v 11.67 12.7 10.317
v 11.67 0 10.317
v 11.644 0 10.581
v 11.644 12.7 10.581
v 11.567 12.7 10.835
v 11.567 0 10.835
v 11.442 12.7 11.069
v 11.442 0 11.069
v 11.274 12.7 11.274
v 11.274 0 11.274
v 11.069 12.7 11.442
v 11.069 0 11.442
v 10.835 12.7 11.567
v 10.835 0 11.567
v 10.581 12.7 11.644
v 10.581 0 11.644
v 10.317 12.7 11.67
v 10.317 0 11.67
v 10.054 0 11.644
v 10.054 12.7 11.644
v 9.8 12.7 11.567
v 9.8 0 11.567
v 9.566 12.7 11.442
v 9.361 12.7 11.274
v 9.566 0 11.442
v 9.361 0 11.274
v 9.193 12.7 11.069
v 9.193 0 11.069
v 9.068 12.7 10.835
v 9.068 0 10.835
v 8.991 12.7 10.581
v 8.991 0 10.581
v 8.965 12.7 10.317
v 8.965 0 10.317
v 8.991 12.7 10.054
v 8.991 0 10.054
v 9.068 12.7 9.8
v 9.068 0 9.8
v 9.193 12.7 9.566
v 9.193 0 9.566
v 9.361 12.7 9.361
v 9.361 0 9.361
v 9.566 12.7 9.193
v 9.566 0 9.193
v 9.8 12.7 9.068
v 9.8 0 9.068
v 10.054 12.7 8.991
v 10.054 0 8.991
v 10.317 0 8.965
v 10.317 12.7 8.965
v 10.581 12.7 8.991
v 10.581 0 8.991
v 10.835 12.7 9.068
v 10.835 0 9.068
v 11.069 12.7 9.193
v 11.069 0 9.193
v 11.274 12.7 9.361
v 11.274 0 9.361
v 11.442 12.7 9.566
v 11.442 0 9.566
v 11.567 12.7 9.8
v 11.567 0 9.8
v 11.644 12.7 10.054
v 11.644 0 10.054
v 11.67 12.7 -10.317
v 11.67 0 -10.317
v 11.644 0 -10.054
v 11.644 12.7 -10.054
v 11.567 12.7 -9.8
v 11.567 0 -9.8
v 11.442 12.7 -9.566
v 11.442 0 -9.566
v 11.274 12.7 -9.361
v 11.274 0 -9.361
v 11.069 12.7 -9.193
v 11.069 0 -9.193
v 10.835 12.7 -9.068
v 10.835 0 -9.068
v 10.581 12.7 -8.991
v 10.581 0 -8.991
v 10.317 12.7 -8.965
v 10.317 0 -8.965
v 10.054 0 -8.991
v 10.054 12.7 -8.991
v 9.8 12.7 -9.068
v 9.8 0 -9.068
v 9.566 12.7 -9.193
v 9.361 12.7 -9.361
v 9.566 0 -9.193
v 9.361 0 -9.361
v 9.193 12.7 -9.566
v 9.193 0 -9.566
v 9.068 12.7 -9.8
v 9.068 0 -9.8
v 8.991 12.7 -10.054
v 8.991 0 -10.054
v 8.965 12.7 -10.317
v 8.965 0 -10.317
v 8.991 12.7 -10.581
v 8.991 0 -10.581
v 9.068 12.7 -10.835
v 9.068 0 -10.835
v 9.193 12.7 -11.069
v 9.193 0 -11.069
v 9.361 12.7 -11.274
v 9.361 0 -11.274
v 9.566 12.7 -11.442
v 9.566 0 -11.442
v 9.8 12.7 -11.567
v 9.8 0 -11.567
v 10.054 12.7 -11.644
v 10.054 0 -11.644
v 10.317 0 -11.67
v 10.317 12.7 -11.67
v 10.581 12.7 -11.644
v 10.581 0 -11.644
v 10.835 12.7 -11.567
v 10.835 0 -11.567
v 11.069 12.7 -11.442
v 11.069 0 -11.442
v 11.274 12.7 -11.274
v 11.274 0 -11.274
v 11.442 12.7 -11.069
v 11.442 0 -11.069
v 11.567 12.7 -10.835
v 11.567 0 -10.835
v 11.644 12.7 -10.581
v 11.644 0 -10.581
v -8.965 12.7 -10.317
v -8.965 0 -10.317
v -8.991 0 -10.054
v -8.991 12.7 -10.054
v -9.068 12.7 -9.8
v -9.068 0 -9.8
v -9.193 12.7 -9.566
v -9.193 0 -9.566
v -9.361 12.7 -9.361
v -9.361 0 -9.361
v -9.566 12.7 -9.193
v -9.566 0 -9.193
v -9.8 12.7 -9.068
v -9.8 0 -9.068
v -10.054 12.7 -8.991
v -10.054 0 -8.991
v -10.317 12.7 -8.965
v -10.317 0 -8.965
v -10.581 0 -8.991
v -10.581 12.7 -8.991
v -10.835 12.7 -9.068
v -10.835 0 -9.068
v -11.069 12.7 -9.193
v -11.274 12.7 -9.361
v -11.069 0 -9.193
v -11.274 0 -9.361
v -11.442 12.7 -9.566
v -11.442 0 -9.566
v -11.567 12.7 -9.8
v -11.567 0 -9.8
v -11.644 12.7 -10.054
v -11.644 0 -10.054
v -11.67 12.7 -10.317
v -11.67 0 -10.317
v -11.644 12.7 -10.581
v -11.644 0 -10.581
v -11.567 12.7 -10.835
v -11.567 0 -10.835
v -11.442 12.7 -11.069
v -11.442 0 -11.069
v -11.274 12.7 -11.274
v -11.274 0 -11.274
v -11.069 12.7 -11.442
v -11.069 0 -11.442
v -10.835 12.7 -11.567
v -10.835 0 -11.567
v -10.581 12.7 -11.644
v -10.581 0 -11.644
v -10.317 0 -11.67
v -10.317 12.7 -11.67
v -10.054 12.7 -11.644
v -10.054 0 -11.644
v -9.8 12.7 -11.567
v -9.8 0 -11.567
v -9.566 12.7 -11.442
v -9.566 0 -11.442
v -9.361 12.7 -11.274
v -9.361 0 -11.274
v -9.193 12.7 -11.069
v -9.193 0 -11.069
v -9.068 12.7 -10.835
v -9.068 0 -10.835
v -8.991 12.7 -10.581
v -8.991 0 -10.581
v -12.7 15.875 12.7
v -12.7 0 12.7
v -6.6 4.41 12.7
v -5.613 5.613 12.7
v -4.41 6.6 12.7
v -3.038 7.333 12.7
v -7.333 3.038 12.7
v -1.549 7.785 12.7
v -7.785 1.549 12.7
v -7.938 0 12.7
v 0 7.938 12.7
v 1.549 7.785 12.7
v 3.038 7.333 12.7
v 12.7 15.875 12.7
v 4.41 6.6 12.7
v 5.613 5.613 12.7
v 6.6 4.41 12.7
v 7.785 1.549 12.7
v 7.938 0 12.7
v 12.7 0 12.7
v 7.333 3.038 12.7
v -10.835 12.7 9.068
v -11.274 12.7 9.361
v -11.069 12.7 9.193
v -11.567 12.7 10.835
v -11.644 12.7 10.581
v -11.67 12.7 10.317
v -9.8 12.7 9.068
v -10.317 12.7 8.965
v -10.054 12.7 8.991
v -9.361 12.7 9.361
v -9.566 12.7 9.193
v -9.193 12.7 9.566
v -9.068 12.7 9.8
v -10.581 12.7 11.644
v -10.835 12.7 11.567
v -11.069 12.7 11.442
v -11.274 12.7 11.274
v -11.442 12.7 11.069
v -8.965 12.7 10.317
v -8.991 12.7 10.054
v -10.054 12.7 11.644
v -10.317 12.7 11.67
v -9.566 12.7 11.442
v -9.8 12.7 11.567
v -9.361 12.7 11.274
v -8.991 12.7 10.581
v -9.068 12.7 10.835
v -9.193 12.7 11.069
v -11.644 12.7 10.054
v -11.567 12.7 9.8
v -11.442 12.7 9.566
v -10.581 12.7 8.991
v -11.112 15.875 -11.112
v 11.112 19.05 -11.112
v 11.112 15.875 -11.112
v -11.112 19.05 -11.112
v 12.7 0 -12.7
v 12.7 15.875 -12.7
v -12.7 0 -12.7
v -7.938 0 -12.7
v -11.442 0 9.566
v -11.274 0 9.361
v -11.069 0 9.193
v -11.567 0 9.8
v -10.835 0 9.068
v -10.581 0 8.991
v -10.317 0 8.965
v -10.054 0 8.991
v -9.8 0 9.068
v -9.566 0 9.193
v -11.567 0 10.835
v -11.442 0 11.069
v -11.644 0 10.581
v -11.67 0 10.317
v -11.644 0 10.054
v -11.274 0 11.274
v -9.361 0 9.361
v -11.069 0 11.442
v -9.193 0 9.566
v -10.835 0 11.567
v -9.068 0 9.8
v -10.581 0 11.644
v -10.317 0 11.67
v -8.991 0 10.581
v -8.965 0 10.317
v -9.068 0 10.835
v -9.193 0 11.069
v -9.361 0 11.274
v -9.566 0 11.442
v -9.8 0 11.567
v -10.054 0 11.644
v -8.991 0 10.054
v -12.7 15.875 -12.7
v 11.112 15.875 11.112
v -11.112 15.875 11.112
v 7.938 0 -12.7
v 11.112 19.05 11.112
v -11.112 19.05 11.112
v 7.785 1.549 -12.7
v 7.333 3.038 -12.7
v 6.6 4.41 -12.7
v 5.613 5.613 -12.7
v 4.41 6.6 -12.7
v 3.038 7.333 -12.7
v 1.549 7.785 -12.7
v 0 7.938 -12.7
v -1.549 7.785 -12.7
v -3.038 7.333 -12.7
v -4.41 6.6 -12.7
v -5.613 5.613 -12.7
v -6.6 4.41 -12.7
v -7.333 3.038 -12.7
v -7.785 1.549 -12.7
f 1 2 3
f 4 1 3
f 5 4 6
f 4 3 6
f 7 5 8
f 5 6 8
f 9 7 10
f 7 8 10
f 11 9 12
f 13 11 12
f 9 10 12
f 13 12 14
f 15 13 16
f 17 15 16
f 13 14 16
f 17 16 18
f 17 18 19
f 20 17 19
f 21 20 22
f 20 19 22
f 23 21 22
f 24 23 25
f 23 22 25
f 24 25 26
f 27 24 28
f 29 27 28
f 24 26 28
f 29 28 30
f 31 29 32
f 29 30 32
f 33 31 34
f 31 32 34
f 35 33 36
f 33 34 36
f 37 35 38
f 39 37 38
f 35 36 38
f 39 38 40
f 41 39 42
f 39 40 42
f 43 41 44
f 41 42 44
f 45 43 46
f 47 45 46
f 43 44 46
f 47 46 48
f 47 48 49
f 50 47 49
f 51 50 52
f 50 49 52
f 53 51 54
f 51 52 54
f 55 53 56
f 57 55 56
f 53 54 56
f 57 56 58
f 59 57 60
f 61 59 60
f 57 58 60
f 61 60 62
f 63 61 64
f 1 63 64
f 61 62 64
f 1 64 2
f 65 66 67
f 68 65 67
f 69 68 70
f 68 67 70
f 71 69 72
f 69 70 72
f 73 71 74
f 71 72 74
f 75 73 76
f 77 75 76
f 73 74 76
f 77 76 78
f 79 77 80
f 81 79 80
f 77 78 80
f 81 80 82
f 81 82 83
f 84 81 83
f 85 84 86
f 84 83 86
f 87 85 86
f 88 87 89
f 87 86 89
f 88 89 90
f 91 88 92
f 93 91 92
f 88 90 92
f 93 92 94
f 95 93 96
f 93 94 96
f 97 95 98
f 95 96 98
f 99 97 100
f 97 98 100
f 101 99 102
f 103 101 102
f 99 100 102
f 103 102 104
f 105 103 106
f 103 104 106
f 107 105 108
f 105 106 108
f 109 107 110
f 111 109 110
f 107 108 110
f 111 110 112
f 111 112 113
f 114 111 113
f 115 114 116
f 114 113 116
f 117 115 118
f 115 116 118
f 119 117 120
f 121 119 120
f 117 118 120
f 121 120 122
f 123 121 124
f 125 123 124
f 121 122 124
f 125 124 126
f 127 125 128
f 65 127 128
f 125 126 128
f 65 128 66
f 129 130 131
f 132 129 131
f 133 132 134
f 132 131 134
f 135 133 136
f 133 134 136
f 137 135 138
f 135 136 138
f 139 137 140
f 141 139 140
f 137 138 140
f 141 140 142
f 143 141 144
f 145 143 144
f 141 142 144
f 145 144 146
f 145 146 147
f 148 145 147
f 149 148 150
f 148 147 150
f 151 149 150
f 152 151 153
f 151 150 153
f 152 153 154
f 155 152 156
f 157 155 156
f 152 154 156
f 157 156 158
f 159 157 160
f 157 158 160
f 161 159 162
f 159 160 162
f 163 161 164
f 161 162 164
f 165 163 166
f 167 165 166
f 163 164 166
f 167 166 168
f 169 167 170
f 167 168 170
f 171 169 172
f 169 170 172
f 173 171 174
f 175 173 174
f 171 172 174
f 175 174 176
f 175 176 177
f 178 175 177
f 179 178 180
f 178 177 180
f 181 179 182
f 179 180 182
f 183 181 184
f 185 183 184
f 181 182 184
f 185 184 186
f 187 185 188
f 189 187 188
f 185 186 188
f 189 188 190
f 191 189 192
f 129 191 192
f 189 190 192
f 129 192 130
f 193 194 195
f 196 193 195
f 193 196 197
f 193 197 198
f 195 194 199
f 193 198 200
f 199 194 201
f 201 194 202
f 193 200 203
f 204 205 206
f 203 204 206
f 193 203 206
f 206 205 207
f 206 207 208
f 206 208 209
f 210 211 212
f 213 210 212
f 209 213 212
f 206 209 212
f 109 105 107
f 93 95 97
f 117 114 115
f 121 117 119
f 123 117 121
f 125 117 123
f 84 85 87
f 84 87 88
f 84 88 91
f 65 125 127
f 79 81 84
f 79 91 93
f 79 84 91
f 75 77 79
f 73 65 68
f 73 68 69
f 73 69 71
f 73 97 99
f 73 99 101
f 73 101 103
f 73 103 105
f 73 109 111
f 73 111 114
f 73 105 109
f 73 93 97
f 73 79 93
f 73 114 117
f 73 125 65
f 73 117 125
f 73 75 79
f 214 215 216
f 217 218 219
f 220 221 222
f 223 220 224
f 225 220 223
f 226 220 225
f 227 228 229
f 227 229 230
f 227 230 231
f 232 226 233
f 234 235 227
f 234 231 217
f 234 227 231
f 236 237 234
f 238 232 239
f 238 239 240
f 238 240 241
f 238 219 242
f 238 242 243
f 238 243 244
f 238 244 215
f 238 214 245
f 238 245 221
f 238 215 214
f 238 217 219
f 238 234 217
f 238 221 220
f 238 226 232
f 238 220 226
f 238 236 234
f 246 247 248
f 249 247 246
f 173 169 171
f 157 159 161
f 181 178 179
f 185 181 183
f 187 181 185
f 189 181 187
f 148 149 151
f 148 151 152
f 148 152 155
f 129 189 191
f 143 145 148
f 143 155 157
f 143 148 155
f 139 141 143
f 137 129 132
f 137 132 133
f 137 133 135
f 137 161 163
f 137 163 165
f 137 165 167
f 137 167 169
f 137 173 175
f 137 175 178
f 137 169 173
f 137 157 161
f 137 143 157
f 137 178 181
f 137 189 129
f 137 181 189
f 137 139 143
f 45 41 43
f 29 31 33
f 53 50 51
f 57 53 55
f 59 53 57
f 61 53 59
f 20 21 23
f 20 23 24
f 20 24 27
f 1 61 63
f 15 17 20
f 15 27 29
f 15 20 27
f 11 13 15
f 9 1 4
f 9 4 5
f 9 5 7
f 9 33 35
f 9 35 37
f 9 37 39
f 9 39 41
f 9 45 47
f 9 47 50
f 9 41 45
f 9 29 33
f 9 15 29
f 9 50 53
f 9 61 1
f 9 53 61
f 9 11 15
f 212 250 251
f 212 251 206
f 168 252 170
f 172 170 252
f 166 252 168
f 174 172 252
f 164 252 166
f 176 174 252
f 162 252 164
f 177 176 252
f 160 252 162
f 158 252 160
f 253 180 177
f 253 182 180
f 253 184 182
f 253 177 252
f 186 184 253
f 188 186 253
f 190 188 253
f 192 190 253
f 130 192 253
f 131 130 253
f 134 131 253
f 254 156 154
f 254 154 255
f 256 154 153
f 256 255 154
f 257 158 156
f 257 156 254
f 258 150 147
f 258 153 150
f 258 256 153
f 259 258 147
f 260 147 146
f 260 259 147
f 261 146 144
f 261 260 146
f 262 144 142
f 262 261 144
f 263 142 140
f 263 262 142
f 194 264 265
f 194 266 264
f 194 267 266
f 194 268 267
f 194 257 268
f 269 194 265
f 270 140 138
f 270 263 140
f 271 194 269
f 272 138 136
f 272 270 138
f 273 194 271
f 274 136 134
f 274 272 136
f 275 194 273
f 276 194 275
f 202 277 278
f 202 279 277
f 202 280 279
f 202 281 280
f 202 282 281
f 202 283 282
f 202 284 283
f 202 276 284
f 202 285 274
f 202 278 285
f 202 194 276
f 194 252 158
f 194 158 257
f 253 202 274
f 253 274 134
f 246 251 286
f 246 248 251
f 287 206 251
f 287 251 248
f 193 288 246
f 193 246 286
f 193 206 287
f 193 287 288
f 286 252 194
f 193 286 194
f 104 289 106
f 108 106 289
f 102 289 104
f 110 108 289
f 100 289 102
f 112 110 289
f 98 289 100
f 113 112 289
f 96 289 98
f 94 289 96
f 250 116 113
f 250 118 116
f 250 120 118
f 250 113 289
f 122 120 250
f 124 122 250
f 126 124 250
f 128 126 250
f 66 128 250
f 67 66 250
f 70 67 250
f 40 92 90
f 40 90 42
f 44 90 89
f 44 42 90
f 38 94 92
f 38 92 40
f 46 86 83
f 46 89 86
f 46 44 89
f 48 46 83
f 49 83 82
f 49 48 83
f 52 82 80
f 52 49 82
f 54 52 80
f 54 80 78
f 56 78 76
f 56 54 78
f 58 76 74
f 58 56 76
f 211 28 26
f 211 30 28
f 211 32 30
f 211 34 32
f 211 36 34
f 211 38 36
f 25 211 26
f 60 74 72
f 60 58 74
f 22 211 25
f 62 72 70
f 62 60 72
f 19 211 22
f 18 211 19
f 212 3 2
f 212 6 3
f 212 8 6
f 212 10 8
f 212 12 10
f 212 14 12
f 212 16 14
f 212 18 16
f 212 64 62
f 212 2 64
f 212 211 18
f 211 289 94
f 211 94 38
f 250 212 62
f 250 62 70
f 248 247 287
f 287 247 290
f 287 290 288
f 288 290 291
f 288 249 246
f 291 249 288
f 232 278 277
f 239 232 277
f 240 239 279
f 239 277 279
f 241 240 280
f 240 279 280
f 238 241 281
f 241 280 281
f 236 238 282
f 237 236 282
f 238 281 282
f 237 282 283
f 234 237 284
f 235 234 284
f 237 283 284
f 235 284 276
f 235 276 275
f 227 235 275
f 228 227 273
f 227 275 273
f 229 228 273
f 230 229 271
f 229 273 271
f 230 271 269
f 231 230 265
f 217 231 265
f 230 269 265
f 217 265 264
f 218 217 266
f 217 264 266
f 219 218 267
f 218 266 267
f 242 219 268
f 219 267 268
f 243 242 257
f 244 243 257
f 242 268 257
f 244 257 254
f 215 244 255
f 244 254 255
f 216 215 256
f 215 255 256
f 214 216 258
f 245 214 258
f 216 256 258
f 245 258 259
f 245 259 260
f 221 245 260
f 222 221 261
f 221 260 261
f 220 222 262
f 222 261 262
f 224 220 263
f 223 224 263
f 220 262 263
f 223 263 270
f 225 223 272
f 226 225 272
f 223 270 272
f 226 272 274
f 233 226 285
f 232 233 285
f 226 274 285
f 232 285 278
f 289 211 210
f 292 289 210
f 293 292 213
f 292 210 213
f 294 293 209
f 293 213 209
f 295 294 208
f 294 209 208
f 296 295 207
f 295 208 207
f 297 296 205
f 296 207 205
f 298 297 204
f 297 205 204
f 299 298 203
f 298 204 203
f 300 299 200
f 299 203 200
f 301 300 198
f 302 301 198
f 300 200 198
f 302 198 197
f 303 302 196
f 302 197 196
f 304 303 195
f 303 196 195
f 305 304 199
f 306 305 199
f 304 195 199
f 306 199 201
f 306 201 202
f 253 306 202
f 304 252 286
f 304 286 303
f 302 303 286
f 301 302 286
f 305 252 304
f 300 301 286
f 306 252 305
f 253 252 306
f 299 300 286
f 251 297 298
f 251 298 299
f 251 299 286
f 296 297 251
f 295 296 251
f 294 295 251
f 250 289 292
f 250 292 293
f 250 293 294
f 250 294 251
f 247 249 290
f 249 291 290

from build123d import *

# Parameters (mm, degrees)
F0_W     = 25.4
F0_H     = 25.4
F1_DEPTH = 19.05
F2_R     = 7.9375
F3_DEPTH = 25.401
F4_W     = 25.4
F4_H     = 25.4
F4_W_2   = 22.225
F4_H_2   = 22.225
F5_DEPTH = 3.175
F6_R     = 1.35255
F7_DEPTH = 12.7


with BuildPart() as f1:
    # F0 (on Front) → F1 (new body)
    with BuildSketch(Plane.XZ):
        Rectangle(F0_W, F0_H)
    extrude(amount=-F1_DEPTH)

    # F2 (on face) → F3 (cut, through all)
    with BuildSketch(Plane.XY.offset(12.7)):
        Circle(F2_R)
    extrude(amount=-F3_DEPTH, mode=Mode.SUBTRACT)

    # F4 (on face) → F5 (cut)
    with BuildSketch(Plane(origin=(0, 19.05, 0), x_dir=(-1, 0, 0), z_dir=(0, 1, 0))):
        Rectangle(F4_W, F4_H)
        Rectangle(F4_W_2, F4_H_2, mode=Mode.SUBTRACT)
    extrude(amount=-F5_DEPTH, mode=Mode.SUBTRACT)

    # F6 (on face) → F7 (cut)
    with BuildSketch(Plane.XZ):
        with Locations((-10.31748, 10.31748)):
            Circle(F6_R)
        with Locations((-10.31748, -10.31748)):
            Circle(F6_R)
        with Locations((10.31748, 10.31748)):
            Circle(F6_R)
        with Locations((10.31748, -10.31748)):
            Circle(F6_R)
    extrude(amount=-F7_DEPTH, mode=Mode.SUBTRACT)


solid = f1.part
